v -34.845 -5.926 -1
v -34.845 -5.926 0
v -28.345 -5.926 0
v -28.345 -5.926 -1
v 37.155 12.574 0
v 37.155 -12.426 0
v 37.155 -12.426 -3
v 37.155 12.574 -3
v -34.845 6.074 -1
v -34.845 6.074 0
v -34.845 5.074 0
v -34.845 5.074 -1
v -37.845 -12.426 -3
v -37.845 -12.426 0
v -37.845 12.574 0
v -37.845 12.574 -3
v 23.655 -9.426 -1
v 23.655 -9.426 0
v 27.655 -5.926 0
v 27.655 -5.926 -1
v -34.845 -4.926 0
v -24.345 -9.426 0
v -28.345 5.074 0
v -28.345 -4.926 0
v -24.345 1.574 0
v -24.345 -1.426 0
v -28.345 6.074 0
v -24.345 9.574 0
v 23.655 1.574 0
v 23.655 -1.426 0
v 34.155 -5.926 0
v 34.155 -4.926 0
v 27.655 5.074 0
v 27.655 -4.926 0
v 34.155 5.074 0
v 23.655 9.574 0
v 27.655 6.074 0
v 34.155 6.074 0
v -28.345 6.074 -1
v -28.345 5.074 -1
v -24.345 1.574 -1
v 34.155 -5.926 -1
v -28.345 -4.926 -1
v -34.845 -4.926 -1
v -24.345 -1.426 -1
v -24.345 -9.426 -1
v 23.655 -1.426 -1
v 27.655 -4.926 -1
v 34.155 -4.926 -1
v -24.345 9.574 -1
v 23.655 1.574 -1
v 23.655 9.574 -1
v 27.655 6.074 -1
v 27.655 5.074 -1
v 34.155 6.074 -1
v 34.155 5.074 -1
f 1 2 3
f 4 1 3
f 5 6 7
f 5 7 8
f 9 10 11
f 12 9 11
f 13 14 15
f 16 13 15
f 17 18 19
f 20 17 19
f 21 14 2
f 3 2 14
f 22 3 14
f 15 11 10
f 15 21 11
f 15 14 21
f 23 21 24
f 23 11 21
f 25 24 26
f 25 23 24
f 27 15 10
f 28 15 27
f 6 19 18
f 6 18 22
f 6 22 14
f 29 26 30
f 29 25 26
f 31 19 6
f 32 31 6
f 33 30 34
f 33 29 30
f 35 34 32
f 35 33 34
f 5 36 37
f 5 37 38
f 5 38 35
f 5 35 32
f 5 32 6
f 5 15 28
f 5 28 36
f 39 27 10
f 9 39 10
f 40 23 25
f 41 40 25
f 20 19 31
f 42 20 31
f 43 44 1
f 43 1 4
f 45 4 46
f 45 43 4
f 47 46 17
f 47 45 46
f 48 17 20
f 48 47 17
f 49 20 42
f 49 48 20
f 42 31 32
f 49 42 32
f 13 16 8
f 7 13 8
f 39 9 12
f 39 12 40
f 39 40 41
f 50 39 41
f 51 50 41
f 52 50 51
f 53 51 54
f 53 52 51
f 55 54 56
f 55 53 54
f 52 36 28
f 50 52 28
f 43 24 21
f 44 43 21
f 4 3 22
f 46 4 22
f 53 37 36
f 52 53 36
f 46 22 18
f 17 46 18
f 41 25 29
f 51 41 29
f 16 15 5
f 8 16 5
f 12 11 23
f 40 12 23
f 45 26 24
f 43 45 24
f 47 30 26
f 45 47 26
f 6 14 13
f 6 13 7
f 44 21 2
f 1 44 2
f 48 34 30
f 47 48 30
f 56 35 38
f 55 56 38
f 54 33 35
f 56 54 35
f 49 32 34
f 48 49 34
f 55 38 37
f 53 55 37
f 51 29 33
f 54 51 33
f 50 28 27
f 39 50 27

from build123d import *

# Parameters (mm, degrees)
F0_W     = 75
F0_H     = 25
F1_DEPTH = 3
F2_DEPTH = 1


with BuildPart() as f1:
    # F0 (on Top) → F1 (new body)
    with BuildSketch(Plane.XY):
        with Locations((-0.3449308872, 0.0735294118)):
            Rectangle(F0_W, F0_H)
        with BuildLine():
            ThreePointArc((-29.8784137004, -5.9264705882), (-37.3449308872, -5.4264705882), (-29.8784137004, -4.9264705882))
            Line((-29.8784137004, -4.9264705882), (-28.3449308872, -4.9264705882))
            Line((-28.3449308872, -4.9264705882), (-24.3449308872, -1.4264705882))
            Line((-24.3449308872, -1.4264705882), (23.6550691128, -1.4264705882))
            Line((23.6550691128, -1.4264705882), (27.6550691128, -4.9264705882))
            Line((27.6550691128, -4.9264705882), (29.1885519259, -4.9264705882))
            ThreePointArc((29.1885519259, -4.9264705882), (33.1556290351, -1.6848506549), (36.6550691128, -5.4264705882))
            ThreePointArc((36.6550691128, -5.4264705882), (33.1556290351, -9.1680905215), (29.1885519259, -5.9264705882))
            Line((29.1885519259, -5.9264705882), (27.6550691128, -5.9264705882))
            Line((27.6550691128, -5.9264705882), (23.6550691128, -9.4264705882))
            Line((23.6550691128, -9.4264705882), (-24.3449308872, -9.4264705882))
            Line((-24.3449308872, -9.4264705882), (-28.3449308872, -5.9264705882))
            Line((-28.3449308872, -5.9264705882), (-29.8784137004, -5.9264705882))
        make_face(mode=Mode.SUBTRACT)
        with BuildLine():
            ThreePointArc((-29.8784137004, 5.0735294118), (-37.3449308872, 5.5735294118), (-29.8784137004, 6.0735294118))
            Line((-29.8784137004, 6.0735294118), (-28.3449308872, 6.0735294118))
            Line((-28.3449308872, 6.0735294118), (-24.3449308872, 9.5735294118))
            Line((-24.3449308872, 9.5735294118), (23.6550691128, 9.5735294118))
            Line((23.6550691128, 9.5735294118), (27.6550691128, 6.0735294118))
            Line((27.6550691128, 6.0735294118), (29.1885519259, 6.0735294118))
            ThreePointArc((29.1885519259, 6.0735294118), (33.1556290351, 9.3151493451), (36.6550691128, 5.5735294118))
            ThreePointArc((36.6550691128, 5.5735294118), (33.1556290351, 1.8319094785), (29.1885519259, 5.0735294118))
            Line((29.1885519259, 5.0735294118), (27.6550691128, 5.0735294118))
            Line((27.6550691128, 5.0735294118), (23.6550691128, 1.5735294118))
            Line((23.6550691128, 1.5735294118), (-24.3449308872, 1.5735294118))
            Line((-24.3449308872, 1.5735294118), (-28.3449308872, 5.0735294118))
            Line((-28.3449308872, 5.0735294118), (-29.8784137004, 5.0735294118))
        make_face(mode=Mode.SUBTRACT)
        Polygon((-24.3449308872, -1.4264705882), (-28.3449308872, -4.9264705882), (-28.3449308872, -5.9264705882), (-24.3449308872, -9.4264705882), (23.6550691128, -9.4264705882), (27.6550691128, -5.9264705882), (27.6550691128, -4.9264705882), (23.6550691128, -1.4264705882), align=None)
        Polygon((-24.3449308872, 9.5735294118), (-28.3449308872, 6.0735294118), (-28.3449308872, 5.0735294118), (-24.3449308872, 1.5735294118), (23.6550691128, 1.5735294118), (27.6550691128, 5.0735294118), (27.6550691128, 6.0735294118), (23.6550691128, 9.5735294118), align=None)
        with BuildLine():
            ThreePointArc((36.6550691128, 5.5735294118), (33.1556290351, 9.3151493451), (29.1885519259, 6.0735294118))
            Line((29.1885519259, 6.0735294118), (31.2280181297, 6.0735294118))
            ThreePointArc((31.2280181297, 6.0735294118), (33.1577158815, 7.3051961263), (34.6550691128, 5.5735294118))
            ThreePointArc((34.6550691128, 5.5735294118), (33.1577158815, 3.8418626972), (31.2280181297, 5.0735294118))
            Line((31.2280181297, 5.0735294118), (29.1885519259, 5.0735294118))
            ThreePointArc((29.1885519259, 5.0735294118), (33.1556290351, 1.8319094785), (36.6550691128, 5.5735294118))
        make_face()
        with BuildLine():
            ThreePointArc((34.6550691128, 5.5735294118), (33.1577158815, 7.3051961263), (31.2280181297, 6.0735294118))
            Line((31.2280181297, 6.0735294118), (34.1550691128, 6.0735294118))
            Line((34.1550691128, 6.0735294118), (34.1550691128, 5.0735294118))
            Line((34.1550691128, 5.0735294118), (31.2280181297, 5.0735294118))
            ThreePointArc((31.2280181297, 5.0735294118), (33.1577158815, 3.8418626972), (34.6550691128, 5.5735294118))
        make_face()
        with BuildLine():
            Line((34.1550691128, 6.0735294118), (31.2280181297, 6.0735294118))
            ThreePointArc((31.2280181297, 6.0735294118), (31.1550691128, 5.5735294118), (31.2280181297, 5.0735294118))
            Line((31.2280181297, 5.0735294118), (34.1550691128, 5.0735294118))
            Line((34.1550691128, 5.0735294118), (34.1550691128, 6.0735294118))
        make_face()
        with BuildLine():
            Line((31.2280181297, 6.0735294118), (29.1885519259, 6.0735294118))
            ThreePointArc((29.1885519259, 6.0735294118), (29.1550691128, 5.5735294118), (29.1885519259, 5.0735294118))
            Line((29.1885519259, 5.0735294118), (31.2280181297, 5.0735294118))
            ThreePointArc((31.2280181297, 5.0735294118), (31.1550691128, 5.5735294118), (31.2280181297, 6.0735294118))
        make_face()
        with BuildLine():
            ThreePointArc((36.6550691128, -5.4264705882), (33.1556290351, -1.6848506549), (29.1885519259, -4.9264705882))
            Line((29.1885519259, -4.9264705882), (31.2280181297, -4.9264705882))
            ThreePointArc((31.2280181297, -4.9264705882), (33.1577158815, -3.6948038737), (34.6550691128, -5.4264705882))
            ThreePointArc((34.6550691128, -5.4264705882), (33.1577158815, -7.1581373028), (31.2280181297, -5.9264705882))
            Line((31.2280181297, -5.9264705882), (29.1885519259, -5.9264705882))
            ThreePointArc((29.1885519259, -5.9264705882), (33.1556290351, -9.1680905215), (36.6550691128, -5.4264705882))
        make_face()
        with BuildLine():
            ThreePointArc((34.6550691128, -5.4264705882), (33.1577158815, -3.6948038737), (31.2280181297, -4.9264705882))
            Line((31.2280181297, -4.9264705882), (34.1550691128, -4.9264705882))
            Line((34.1550691128, -4.9264705882), (34.1550691128, -5.9264705882))
            Line((34.1550691128, -5.9264705882), (31.2280181297, -5.9264705882))
            ThreePointArc((31.2280181297, -5.9264705882), (33.1577158815, -7.1581373028), (34.6550691128, -5.4264705882))
        make_face()
        with BuildLine():
            Line((34.1550691128, -4.9264705882), (31.2280181297, -4.9264705882))
            ThreePointArc((31.2280181297, -4.9264705882), (31.1550691128, -5.4264705882), (31.2280181297, -5.9264705882))
            Line((31.2280181297, -5.9264705882), (34.1550691128, -5.9264705882))
            Line((34.1550691128, -5.9264705882), (34.1550691128, -4.9264705882))
        make_face()
        with BuildLine():
            Line((31.2280181297, -4.9264705882), (29.1885519259, -4.9264705882))
            ThreePointArc((29.1885519259, -4.9264705882), (29.1550691128, -5.4264705882), (29.1885519259, -5.9264705882))
            Line((29.1885519259, -5.9264705882), (31.2280181297, -5.9264705882))
            ThreePointArc((31.2280181297, -5.9264705882), (31.1550691128, -5.4264705882), (31.2280181297, -4.9264705882))
        make_face()
        with BuildLine():
            ThreePointArc((-31.9178799041, -5.9264705882), (-35.3449308872, -5.4264705882), (-31.9178799041, -4.9264705882))
            Line((-31.9178799041, -4.9264705882), (-29.8784137004, -4.9264705882))
            ThreePointArc((-29.8784137004, -4.9264705882), (-37.3449308872, -5.4264705882), (-29.8784137004, -5.9264705882))
            Line((-29.8784137004, -5.9264705882), (-31.9178799041, -5.9264705882))
        make_face()
        with BuildLine():
            Line((-29.8784137004, -4.9264705882), (-31.9178799041, -4.9264705882))
            ThreePointArc((-31.9178799041, -4.9264705882), (-31.8632641727, -5.1738238195), (-31.8449308872, -5.4264705882))
            ThreePointArc((-31.8449308872, -5.4264705882), (-31.8632641727, -5.679117357), (-31.9178799041, -5.9264705882))
            Line((-31.9178799041, -5.9264705882), (-29.8784137004, -5.9264705882))
            ThreePointArc((-29.8784137004, -5.9264705882), (-29.8533109539, -5.6770305106), (-29.8449308872, -5.4264705882))
            ThreePointArc((-29.8449308872, -5.4264705882), (-29.8533109539, -5.1759106659), (-29.8784137004, -4.9264705882))
        make_face()
        with BuildLine():
            Line((-34.8449308872, -5.9264705882), (-34.8449308872, -4.9264705882))
            Line((-34.8449308872, -4.9264705882), (-31.9178799041, -4.9264705882))
            ThreePointArc((-31.9178799041, -4.9264705882), (-35.3449308872, -5.4264705882), (-31.9178799041, -5.9264705882))
            Line((-31.9178799041, -5.9264705882), (-34.8449308872, -5.9264705882))
        make_face()
        with BuildLine():
            Line((-31.9178799041, -4.9264705882), (-34.8449308872, -4.9264705882))
            Line((-34.8449308872, -4.9264705882), (-34.8449308872, -5.9264705882))
            Line((-34.8449308872, -5.9264705882), (-31.9178799041, -5.9264705882))
            ThreePointArc((-31.9178799041, -5.9264705882), (-31.8632641727, -5.679117357), (-31.8449308872, -5.4264705882))
            ThreePointArc((-31.8449308872, -5.4264705882), (-31.8632641727, -5.1738238195), (-31.9178799041, -4.9264705882))
        make_face()
        with BuildLine():
            ThreePointArc((-31.9178799041, 5.0735294118), (-35.3449308872, 5.5735294118), (-31.9178799041, 6.0735294118))
            Line((-31.9178799041, 6.0735294118), (-29.8784137004, 6.0735294118))
            ThreePointArc((-29.8784137004, 6.0735294118), (-37.3449308872, 5.5735294118), (-29.8784137004, 5.0735294118))
            Line((-29.8784137004, 5.0735294118), (-31.9178799041, 5.0735294118))
        make_face()
        with BuildLine():
            Line((-29.8784137004, 6.0735294118), (-31.9178799041, 6.0735294118))
            ThreePointArc((-31.9178799041, 6.0735294118), (-31.8632641727, 5.8261761805), (-31.8449308872, 5.5735294118))
            ThreePointArc((-31.8449308872, 5.5735294118), (-31.8632641727, 5.320882643), (-31.9178799041, 5.0735294118))
            Line((-31.9178799041, 5.0735294118), (-29.8784137004, 5.0735294118))
            ThreePointArc((-29.8784137004, 5.0735294118), (-29.8533109539, 5.3229694894), (-29.8449308872, 5.5735294118))
            ThreePointArc((-29.8449308872, 5.5735294118), (-29.8533109539, 5.8240893341), (-29.8784137004, 6.0735294118))
        make_face()
        with BuildLine():
            Line((-34.8449308872, 5.0735294118), (-34.8449308872, 6.0735294118))
            Line((-34.8449308872, 6.0735294118), (-31.9178799041, 6.0735294118))
            ThreePointArc((-31.9178799041, 6.0735294118), (-35.3449308872, 5.5735294118), (-31.9178799041, 5.0735294118))
            Line((-31.9178799041, 5.0735294118), (-34.8449308872, 5.0735294118))
        make_face()
        with BuildLine():
            Line((-31.9178799041, 6.0735294118), (-34.8449308872, 6.0735294118))
            Line((-34.8449308872, 6.0735294118), (-34.8449308872, 5.0735294118))
            Line((-34.8449308872, 5.0735294118), (-31.9178799041, 5.0735294118))
            ThreePointArc((-31.9178799041, 5.0735294118), (-31.8632641727, 5.320882643), (-31.8449308872, 5.5735294118))
            ThreePointArc((-31.8449308872, 5.5735294118), (-31.8632641727, 5.8261761805), (-31.9178799041, 6.0735294118))
        make_face()
        with BuildLine():
            Line((29.1885519259, 6.0735294118), (27.6550691128, 6.0735294118))
            Line((27.6550691128, 6.0735294118), (27.6550691128, 5.0735294118))
            Line((27.6550691128, 5.0735294118), (29.1885519259, 5.0735294118))
            ThreePointArc((29.1885519259, 5.0735294118), (29.1550691128, 5.5735294118), (29.1885519259, 6.0735294118))
        make_face()
        with BuildLine():
            Line((29.1885519259, -4.9264705882), (27.6550691128, -4.9264705882))
            Line((27.6550691128, -4.9264705882), (27.6550691128, -5.9264705882))
            Line((27.6550691128, -5.9264705882), (29.1885519259, -5.9264705882))
            ThreePointArc((29.1885519259, -5.9264705882), (29.1550691128, -5.4264705882), (29.1885519259, -4.9264705882))
        make_face()
        with BuildLine():
            Line((-28.3449308872, 6.0735294118), (-29.8784137004, 6.0735294118))
            ThreePointArc((-29.8784137004, 6.0735294118), (-29.8533109539, 5.8240893341), (-29.8449308872, 5.5735294118))
            ThreePointArc((-29.8449308872, 5.5735294118), (-29.8533109539, 5.3229694894), (-29.8784137004, 5.0735294118))
            Line((-29.8784137004, 5.0735294118), (-28.3449308872, 5.0735294118))
            Line((-28.3449308872, 5.0735294118), (-28.3449308872, 6.0735294118))
        make_face()
        with BuildLine():
            Line((-28.3449308872, -4.9264705882), (-29.8784137004, -4.9264705882))
            ThreePointArc((-29.8784137004, -4.9264705882), (-29.8533109539, -5.1759106659), (-29.8449308872, -5.4264705882))
            ThreePointArc((-29.8449308872, -5.4264705882), (-29.8533109539, -5.6770305106), (-29.8784137004, -5.9264705882))
            Line((-29.8784137004, -5.9264705882), (-28.3449308872, -5.9264705882))
            Line((-28.3449308872, -5.9264705882), (-28.3449308872, -4.9264705882))
        make_face()
    extrude(amount=-F1_DEPTH)

    # F0 (on Top) → F2 (cut)
    with BuildSketch(Plane.XY):
        Polygon((-24.3449308872, -1.4264705882), (-28.3449308872, -4.9264705882), (-28.3449308872, -5.9264705882), (-24.3449308872, -9.4264705882), (23.6550691128, -9.4264705882), (27.6550691128, -5.9264705882), (27.6550691128, -4.9264705882), (23.6550691128, -1.4264705882), align=None)
        Polygon((-24.3449308872, 9.5735294118), (-28.3449308872, 6.0735294118), (-28.3449308872, 5.0735294118), (-24.3449308872, 1.5735294118), (23.6550691128, 1.5735294118), (27.6550691128, 5.0735294118), (27.6550691128, 6.0735294118), (23.6550691128, 9.5735294118), align=None)
        with BuildLine():
            Line((31.2280181297, -4.9264705882), (29.1885519259, -4.9264705882))
            ThreePointArc((29.1885519259, -4.9264705882), (29.1550691128, -5.4264705882), (29.1885519259, -5.9264705882))
            Line((29.1885519259, -5.9264705882), (31.2280181297, -5.9264705882))
            ThreePointArc((31.2280181297, -5.9264705882), (31.1550691128, -5.4264705882), (31.2280181297, -4.9264705882))
        make_face()
        with BuildLine():
            Line((34.1550691128, -4.9264705882), (31.2280181297, -4.9264705882))
            ThreePointArc((31.2280181297, -4.9264705882), (31.1550691128, -5.4264705882), (31.2280181297, -5.9264705882))
            Line((31.2280181297, -5.9264705882), (34.1550691128, -5.9264705882))
            Line((34.1550691128, -5.9264705882), (34.1550691128, -4.9264705882))
        make_face()
        with BuildLine():
            Line((31.2280181297, 6.0735294118), (29.1885519259, 6.0735294118))
            ThreePointArc((29.1885519259, 6.0735294118), (29.1550691128, 5.5735294118), (29.1885519259, 5.0735294118))
            Line((29.1885519259, 5.0735294118), (31.2280181297, 5.0735294118))
            ThreePointArc((31.2280181297, 5.0735294118), (31.1550691128, 5.5735294118), (31.2280181297, 6.0735294118))
        make_face()
        with BuildLine():
            Line((34.1550691128, 6.0735294118), (31.2280181297, 6.0735294118))
            ThreePointArc((31.2280181297, 6.0735294118), (31.1550691128, 5.5735294118), (31.2280181297, 5.0735294118))
            Line((31.2280181297, 5.0735294118), (34.1550691128, 5.0735294118))
            Line((34.1550691128, 5.0735294118), (34.1550691128, 6.0735294118))
        make_face()
        with BuildLine():
            Line((-31.9178799041, -4.9264705882), (-34.8449308872, -4.9264705882))
            Line((-34.8449308872, -4.9264705882), (-34.8449308872, -5.9264705882))
            Line((-34.8449308872, -5.9264705882), (-31.9178799041, -5.9264705882))
            ThreePointArc((-31.9178799041, -5.9264705882), (-31.8632641727, -5.679117357), (-31.8449308872, -5.4264705882))
            ThreePointArc((-31.8449308872, -5.4264705882), (-31.8632641727, -5.1738238195), (-31.9178799041, -4.9264705882))
        make_face()
        with BuildLine():
            Line((-29.8784137004, -4.9264705882), (-31.9178799041, -4.9264705882))
            ThreePointArc((-31.9178799041, -4.9264705882), (-31.8632641727, -5.1738238195), (-31.8449308872, -5.4264705882))
            ThreePointArc((-31.8449308872, -5.4264705882), (-31.8632641727, -5.679117357), (-31.9178799041, -5.9264705882))
            Line((-31.9178799041, -5.9264705882), (-29.8784137004, -5.9264705882))
            ThreePointArc((-29.8784137004, -5.9264705882), (-29.8533109539, -5.6770305106), (-29.8449308872, -5.4264705882))
            ThreePointArc((-29.8449308872, -5.4264705882), (-29.8533109539, -5.1759106659), (-29.8784137004, -4.9264705882))
        make_face()
        with BuildLine():
            Line((-29.8784137004, 6.0735294118), (-31.9178799041, 6.0735294118))
            ThreePointArc((-31.9178799041, 6.0735294118), (-31.8632641727, 5.8261761805), (-31.8449308872, 5.5735294118))
            ThreePointArc((-31.8449308872, 5.5735294118), (-31.8632641727, 5.320882643), (-31.9178799041, 5.0735294118))
            Line((-31.9178799041, 5.0735294118), (-29.8784137004, 5.0735294118))
            ThreePointArc((-29.8784137004, 5.0735294118), (-29.8533109539, 5.3229694894), (-29.8449308872, 5.5735294118))
            ThreePointArc((-29.8449308872, 5.5735294118), (-29.8533109539, 5.8240893341), (-29.8784137004, 6.0735294118))
        make_face()
        with BuildLine():
            Line((-31.9178799041, 6.0735294118), (-34.8449308872, 6.0735294118))
            Line((-34.8449308872, 6.0735294118), (-34.8449308872, 5.0735294118))
            Line((-34.8449308872, 5.0735294118), (-31.9178799041, 5.0735294118))
            ThreePointArc((-31.9178799041, 5.0735294118), (-31.8632641727, 5.320882643), (-31.8449308872, 5.5735294118))
            ThreePointArc((-31.8449308872, 5.5735294118), (-31.8632641727, 5.8261761805), (-31.9178799041, 6.0735294118))
        make_face()
        with BuildLine():
            Line((-28.3449308872, 6.0735294118), (-29.8784137004, 6.0735294118))
            ThreePointArc((-29.8784137004, 6.0735294118), (-29.8533109539, 5.8240893341), (-29.8449308872, 5.5735294118))
            ThreePointArc((-29.8449308872, 5.5735294118), (-29.8533109539, 5.3229694894), (-29.8784137004, 5.0735294118))
            Line((-29.8784137004, 5.0735294118), (-28.3449308872, 5.0735294118))
            Line((-28.3449308872, 5.0735294118), (-28.3449308872, 6.0735294118))
        make_face()
        with BuildLine():
            Line((-28.3449308872, -4.9264705882), (-29.8784137004, -4.9264705882))
            ThreePointArc((-29.8784137004, -4.9264705882), (-29.8533109539, -5.1759106659), (-29.8449308872, -5.4264705882))
            ThreePointArc((-29.8449308872, -5.4264705882), (-29.8533109539, -5.6770305106), (-29.8784137004, -5.9264705882))
            Line((-29.8784137004, -5.9264705882), (-28.3449308872, -5.9264705882))
            Line((-28.3449308872, -5.9264705882), (-28.3449308872, -4.9264705882))
        make_face()
        with BuildLine():
            Line((29.1885519259, 6.0735294118), (27.6550691128, 6.0735294118))
            Line((27.6550691128, 6.0735294118), (27.6550691128, 5.0735294118))
            Line((27.6550691128, 5.0735294118), (29.1885519259, 5.0735294118))
            ThreePointArc((29.1885519259, 5.0735294118), (29.1550691128, 5.5735294118), (29.1885519259, 6.0735294118))
        make_face()
        with BuildLine():
            Line((29.1885519259, -4.9264705882), (27.6550691128, -4.9264705882))
            Line((27.6550691128, -4.9264705882), (27.6550691128, -5.9264705882))
            Line((27.6550691128, -5.9264705882), (29.1885519259, -5.9264705882))
            ThreePointArc((29.1885519259, -5.9264705882), (29.1550691128, -5.4264705882), (29.1885519259, -4.9264705882))
        make_face()
    extrude(amount=-F2_DEPTH, mode=Mode.SUBTRACT)


solid = f1.part
